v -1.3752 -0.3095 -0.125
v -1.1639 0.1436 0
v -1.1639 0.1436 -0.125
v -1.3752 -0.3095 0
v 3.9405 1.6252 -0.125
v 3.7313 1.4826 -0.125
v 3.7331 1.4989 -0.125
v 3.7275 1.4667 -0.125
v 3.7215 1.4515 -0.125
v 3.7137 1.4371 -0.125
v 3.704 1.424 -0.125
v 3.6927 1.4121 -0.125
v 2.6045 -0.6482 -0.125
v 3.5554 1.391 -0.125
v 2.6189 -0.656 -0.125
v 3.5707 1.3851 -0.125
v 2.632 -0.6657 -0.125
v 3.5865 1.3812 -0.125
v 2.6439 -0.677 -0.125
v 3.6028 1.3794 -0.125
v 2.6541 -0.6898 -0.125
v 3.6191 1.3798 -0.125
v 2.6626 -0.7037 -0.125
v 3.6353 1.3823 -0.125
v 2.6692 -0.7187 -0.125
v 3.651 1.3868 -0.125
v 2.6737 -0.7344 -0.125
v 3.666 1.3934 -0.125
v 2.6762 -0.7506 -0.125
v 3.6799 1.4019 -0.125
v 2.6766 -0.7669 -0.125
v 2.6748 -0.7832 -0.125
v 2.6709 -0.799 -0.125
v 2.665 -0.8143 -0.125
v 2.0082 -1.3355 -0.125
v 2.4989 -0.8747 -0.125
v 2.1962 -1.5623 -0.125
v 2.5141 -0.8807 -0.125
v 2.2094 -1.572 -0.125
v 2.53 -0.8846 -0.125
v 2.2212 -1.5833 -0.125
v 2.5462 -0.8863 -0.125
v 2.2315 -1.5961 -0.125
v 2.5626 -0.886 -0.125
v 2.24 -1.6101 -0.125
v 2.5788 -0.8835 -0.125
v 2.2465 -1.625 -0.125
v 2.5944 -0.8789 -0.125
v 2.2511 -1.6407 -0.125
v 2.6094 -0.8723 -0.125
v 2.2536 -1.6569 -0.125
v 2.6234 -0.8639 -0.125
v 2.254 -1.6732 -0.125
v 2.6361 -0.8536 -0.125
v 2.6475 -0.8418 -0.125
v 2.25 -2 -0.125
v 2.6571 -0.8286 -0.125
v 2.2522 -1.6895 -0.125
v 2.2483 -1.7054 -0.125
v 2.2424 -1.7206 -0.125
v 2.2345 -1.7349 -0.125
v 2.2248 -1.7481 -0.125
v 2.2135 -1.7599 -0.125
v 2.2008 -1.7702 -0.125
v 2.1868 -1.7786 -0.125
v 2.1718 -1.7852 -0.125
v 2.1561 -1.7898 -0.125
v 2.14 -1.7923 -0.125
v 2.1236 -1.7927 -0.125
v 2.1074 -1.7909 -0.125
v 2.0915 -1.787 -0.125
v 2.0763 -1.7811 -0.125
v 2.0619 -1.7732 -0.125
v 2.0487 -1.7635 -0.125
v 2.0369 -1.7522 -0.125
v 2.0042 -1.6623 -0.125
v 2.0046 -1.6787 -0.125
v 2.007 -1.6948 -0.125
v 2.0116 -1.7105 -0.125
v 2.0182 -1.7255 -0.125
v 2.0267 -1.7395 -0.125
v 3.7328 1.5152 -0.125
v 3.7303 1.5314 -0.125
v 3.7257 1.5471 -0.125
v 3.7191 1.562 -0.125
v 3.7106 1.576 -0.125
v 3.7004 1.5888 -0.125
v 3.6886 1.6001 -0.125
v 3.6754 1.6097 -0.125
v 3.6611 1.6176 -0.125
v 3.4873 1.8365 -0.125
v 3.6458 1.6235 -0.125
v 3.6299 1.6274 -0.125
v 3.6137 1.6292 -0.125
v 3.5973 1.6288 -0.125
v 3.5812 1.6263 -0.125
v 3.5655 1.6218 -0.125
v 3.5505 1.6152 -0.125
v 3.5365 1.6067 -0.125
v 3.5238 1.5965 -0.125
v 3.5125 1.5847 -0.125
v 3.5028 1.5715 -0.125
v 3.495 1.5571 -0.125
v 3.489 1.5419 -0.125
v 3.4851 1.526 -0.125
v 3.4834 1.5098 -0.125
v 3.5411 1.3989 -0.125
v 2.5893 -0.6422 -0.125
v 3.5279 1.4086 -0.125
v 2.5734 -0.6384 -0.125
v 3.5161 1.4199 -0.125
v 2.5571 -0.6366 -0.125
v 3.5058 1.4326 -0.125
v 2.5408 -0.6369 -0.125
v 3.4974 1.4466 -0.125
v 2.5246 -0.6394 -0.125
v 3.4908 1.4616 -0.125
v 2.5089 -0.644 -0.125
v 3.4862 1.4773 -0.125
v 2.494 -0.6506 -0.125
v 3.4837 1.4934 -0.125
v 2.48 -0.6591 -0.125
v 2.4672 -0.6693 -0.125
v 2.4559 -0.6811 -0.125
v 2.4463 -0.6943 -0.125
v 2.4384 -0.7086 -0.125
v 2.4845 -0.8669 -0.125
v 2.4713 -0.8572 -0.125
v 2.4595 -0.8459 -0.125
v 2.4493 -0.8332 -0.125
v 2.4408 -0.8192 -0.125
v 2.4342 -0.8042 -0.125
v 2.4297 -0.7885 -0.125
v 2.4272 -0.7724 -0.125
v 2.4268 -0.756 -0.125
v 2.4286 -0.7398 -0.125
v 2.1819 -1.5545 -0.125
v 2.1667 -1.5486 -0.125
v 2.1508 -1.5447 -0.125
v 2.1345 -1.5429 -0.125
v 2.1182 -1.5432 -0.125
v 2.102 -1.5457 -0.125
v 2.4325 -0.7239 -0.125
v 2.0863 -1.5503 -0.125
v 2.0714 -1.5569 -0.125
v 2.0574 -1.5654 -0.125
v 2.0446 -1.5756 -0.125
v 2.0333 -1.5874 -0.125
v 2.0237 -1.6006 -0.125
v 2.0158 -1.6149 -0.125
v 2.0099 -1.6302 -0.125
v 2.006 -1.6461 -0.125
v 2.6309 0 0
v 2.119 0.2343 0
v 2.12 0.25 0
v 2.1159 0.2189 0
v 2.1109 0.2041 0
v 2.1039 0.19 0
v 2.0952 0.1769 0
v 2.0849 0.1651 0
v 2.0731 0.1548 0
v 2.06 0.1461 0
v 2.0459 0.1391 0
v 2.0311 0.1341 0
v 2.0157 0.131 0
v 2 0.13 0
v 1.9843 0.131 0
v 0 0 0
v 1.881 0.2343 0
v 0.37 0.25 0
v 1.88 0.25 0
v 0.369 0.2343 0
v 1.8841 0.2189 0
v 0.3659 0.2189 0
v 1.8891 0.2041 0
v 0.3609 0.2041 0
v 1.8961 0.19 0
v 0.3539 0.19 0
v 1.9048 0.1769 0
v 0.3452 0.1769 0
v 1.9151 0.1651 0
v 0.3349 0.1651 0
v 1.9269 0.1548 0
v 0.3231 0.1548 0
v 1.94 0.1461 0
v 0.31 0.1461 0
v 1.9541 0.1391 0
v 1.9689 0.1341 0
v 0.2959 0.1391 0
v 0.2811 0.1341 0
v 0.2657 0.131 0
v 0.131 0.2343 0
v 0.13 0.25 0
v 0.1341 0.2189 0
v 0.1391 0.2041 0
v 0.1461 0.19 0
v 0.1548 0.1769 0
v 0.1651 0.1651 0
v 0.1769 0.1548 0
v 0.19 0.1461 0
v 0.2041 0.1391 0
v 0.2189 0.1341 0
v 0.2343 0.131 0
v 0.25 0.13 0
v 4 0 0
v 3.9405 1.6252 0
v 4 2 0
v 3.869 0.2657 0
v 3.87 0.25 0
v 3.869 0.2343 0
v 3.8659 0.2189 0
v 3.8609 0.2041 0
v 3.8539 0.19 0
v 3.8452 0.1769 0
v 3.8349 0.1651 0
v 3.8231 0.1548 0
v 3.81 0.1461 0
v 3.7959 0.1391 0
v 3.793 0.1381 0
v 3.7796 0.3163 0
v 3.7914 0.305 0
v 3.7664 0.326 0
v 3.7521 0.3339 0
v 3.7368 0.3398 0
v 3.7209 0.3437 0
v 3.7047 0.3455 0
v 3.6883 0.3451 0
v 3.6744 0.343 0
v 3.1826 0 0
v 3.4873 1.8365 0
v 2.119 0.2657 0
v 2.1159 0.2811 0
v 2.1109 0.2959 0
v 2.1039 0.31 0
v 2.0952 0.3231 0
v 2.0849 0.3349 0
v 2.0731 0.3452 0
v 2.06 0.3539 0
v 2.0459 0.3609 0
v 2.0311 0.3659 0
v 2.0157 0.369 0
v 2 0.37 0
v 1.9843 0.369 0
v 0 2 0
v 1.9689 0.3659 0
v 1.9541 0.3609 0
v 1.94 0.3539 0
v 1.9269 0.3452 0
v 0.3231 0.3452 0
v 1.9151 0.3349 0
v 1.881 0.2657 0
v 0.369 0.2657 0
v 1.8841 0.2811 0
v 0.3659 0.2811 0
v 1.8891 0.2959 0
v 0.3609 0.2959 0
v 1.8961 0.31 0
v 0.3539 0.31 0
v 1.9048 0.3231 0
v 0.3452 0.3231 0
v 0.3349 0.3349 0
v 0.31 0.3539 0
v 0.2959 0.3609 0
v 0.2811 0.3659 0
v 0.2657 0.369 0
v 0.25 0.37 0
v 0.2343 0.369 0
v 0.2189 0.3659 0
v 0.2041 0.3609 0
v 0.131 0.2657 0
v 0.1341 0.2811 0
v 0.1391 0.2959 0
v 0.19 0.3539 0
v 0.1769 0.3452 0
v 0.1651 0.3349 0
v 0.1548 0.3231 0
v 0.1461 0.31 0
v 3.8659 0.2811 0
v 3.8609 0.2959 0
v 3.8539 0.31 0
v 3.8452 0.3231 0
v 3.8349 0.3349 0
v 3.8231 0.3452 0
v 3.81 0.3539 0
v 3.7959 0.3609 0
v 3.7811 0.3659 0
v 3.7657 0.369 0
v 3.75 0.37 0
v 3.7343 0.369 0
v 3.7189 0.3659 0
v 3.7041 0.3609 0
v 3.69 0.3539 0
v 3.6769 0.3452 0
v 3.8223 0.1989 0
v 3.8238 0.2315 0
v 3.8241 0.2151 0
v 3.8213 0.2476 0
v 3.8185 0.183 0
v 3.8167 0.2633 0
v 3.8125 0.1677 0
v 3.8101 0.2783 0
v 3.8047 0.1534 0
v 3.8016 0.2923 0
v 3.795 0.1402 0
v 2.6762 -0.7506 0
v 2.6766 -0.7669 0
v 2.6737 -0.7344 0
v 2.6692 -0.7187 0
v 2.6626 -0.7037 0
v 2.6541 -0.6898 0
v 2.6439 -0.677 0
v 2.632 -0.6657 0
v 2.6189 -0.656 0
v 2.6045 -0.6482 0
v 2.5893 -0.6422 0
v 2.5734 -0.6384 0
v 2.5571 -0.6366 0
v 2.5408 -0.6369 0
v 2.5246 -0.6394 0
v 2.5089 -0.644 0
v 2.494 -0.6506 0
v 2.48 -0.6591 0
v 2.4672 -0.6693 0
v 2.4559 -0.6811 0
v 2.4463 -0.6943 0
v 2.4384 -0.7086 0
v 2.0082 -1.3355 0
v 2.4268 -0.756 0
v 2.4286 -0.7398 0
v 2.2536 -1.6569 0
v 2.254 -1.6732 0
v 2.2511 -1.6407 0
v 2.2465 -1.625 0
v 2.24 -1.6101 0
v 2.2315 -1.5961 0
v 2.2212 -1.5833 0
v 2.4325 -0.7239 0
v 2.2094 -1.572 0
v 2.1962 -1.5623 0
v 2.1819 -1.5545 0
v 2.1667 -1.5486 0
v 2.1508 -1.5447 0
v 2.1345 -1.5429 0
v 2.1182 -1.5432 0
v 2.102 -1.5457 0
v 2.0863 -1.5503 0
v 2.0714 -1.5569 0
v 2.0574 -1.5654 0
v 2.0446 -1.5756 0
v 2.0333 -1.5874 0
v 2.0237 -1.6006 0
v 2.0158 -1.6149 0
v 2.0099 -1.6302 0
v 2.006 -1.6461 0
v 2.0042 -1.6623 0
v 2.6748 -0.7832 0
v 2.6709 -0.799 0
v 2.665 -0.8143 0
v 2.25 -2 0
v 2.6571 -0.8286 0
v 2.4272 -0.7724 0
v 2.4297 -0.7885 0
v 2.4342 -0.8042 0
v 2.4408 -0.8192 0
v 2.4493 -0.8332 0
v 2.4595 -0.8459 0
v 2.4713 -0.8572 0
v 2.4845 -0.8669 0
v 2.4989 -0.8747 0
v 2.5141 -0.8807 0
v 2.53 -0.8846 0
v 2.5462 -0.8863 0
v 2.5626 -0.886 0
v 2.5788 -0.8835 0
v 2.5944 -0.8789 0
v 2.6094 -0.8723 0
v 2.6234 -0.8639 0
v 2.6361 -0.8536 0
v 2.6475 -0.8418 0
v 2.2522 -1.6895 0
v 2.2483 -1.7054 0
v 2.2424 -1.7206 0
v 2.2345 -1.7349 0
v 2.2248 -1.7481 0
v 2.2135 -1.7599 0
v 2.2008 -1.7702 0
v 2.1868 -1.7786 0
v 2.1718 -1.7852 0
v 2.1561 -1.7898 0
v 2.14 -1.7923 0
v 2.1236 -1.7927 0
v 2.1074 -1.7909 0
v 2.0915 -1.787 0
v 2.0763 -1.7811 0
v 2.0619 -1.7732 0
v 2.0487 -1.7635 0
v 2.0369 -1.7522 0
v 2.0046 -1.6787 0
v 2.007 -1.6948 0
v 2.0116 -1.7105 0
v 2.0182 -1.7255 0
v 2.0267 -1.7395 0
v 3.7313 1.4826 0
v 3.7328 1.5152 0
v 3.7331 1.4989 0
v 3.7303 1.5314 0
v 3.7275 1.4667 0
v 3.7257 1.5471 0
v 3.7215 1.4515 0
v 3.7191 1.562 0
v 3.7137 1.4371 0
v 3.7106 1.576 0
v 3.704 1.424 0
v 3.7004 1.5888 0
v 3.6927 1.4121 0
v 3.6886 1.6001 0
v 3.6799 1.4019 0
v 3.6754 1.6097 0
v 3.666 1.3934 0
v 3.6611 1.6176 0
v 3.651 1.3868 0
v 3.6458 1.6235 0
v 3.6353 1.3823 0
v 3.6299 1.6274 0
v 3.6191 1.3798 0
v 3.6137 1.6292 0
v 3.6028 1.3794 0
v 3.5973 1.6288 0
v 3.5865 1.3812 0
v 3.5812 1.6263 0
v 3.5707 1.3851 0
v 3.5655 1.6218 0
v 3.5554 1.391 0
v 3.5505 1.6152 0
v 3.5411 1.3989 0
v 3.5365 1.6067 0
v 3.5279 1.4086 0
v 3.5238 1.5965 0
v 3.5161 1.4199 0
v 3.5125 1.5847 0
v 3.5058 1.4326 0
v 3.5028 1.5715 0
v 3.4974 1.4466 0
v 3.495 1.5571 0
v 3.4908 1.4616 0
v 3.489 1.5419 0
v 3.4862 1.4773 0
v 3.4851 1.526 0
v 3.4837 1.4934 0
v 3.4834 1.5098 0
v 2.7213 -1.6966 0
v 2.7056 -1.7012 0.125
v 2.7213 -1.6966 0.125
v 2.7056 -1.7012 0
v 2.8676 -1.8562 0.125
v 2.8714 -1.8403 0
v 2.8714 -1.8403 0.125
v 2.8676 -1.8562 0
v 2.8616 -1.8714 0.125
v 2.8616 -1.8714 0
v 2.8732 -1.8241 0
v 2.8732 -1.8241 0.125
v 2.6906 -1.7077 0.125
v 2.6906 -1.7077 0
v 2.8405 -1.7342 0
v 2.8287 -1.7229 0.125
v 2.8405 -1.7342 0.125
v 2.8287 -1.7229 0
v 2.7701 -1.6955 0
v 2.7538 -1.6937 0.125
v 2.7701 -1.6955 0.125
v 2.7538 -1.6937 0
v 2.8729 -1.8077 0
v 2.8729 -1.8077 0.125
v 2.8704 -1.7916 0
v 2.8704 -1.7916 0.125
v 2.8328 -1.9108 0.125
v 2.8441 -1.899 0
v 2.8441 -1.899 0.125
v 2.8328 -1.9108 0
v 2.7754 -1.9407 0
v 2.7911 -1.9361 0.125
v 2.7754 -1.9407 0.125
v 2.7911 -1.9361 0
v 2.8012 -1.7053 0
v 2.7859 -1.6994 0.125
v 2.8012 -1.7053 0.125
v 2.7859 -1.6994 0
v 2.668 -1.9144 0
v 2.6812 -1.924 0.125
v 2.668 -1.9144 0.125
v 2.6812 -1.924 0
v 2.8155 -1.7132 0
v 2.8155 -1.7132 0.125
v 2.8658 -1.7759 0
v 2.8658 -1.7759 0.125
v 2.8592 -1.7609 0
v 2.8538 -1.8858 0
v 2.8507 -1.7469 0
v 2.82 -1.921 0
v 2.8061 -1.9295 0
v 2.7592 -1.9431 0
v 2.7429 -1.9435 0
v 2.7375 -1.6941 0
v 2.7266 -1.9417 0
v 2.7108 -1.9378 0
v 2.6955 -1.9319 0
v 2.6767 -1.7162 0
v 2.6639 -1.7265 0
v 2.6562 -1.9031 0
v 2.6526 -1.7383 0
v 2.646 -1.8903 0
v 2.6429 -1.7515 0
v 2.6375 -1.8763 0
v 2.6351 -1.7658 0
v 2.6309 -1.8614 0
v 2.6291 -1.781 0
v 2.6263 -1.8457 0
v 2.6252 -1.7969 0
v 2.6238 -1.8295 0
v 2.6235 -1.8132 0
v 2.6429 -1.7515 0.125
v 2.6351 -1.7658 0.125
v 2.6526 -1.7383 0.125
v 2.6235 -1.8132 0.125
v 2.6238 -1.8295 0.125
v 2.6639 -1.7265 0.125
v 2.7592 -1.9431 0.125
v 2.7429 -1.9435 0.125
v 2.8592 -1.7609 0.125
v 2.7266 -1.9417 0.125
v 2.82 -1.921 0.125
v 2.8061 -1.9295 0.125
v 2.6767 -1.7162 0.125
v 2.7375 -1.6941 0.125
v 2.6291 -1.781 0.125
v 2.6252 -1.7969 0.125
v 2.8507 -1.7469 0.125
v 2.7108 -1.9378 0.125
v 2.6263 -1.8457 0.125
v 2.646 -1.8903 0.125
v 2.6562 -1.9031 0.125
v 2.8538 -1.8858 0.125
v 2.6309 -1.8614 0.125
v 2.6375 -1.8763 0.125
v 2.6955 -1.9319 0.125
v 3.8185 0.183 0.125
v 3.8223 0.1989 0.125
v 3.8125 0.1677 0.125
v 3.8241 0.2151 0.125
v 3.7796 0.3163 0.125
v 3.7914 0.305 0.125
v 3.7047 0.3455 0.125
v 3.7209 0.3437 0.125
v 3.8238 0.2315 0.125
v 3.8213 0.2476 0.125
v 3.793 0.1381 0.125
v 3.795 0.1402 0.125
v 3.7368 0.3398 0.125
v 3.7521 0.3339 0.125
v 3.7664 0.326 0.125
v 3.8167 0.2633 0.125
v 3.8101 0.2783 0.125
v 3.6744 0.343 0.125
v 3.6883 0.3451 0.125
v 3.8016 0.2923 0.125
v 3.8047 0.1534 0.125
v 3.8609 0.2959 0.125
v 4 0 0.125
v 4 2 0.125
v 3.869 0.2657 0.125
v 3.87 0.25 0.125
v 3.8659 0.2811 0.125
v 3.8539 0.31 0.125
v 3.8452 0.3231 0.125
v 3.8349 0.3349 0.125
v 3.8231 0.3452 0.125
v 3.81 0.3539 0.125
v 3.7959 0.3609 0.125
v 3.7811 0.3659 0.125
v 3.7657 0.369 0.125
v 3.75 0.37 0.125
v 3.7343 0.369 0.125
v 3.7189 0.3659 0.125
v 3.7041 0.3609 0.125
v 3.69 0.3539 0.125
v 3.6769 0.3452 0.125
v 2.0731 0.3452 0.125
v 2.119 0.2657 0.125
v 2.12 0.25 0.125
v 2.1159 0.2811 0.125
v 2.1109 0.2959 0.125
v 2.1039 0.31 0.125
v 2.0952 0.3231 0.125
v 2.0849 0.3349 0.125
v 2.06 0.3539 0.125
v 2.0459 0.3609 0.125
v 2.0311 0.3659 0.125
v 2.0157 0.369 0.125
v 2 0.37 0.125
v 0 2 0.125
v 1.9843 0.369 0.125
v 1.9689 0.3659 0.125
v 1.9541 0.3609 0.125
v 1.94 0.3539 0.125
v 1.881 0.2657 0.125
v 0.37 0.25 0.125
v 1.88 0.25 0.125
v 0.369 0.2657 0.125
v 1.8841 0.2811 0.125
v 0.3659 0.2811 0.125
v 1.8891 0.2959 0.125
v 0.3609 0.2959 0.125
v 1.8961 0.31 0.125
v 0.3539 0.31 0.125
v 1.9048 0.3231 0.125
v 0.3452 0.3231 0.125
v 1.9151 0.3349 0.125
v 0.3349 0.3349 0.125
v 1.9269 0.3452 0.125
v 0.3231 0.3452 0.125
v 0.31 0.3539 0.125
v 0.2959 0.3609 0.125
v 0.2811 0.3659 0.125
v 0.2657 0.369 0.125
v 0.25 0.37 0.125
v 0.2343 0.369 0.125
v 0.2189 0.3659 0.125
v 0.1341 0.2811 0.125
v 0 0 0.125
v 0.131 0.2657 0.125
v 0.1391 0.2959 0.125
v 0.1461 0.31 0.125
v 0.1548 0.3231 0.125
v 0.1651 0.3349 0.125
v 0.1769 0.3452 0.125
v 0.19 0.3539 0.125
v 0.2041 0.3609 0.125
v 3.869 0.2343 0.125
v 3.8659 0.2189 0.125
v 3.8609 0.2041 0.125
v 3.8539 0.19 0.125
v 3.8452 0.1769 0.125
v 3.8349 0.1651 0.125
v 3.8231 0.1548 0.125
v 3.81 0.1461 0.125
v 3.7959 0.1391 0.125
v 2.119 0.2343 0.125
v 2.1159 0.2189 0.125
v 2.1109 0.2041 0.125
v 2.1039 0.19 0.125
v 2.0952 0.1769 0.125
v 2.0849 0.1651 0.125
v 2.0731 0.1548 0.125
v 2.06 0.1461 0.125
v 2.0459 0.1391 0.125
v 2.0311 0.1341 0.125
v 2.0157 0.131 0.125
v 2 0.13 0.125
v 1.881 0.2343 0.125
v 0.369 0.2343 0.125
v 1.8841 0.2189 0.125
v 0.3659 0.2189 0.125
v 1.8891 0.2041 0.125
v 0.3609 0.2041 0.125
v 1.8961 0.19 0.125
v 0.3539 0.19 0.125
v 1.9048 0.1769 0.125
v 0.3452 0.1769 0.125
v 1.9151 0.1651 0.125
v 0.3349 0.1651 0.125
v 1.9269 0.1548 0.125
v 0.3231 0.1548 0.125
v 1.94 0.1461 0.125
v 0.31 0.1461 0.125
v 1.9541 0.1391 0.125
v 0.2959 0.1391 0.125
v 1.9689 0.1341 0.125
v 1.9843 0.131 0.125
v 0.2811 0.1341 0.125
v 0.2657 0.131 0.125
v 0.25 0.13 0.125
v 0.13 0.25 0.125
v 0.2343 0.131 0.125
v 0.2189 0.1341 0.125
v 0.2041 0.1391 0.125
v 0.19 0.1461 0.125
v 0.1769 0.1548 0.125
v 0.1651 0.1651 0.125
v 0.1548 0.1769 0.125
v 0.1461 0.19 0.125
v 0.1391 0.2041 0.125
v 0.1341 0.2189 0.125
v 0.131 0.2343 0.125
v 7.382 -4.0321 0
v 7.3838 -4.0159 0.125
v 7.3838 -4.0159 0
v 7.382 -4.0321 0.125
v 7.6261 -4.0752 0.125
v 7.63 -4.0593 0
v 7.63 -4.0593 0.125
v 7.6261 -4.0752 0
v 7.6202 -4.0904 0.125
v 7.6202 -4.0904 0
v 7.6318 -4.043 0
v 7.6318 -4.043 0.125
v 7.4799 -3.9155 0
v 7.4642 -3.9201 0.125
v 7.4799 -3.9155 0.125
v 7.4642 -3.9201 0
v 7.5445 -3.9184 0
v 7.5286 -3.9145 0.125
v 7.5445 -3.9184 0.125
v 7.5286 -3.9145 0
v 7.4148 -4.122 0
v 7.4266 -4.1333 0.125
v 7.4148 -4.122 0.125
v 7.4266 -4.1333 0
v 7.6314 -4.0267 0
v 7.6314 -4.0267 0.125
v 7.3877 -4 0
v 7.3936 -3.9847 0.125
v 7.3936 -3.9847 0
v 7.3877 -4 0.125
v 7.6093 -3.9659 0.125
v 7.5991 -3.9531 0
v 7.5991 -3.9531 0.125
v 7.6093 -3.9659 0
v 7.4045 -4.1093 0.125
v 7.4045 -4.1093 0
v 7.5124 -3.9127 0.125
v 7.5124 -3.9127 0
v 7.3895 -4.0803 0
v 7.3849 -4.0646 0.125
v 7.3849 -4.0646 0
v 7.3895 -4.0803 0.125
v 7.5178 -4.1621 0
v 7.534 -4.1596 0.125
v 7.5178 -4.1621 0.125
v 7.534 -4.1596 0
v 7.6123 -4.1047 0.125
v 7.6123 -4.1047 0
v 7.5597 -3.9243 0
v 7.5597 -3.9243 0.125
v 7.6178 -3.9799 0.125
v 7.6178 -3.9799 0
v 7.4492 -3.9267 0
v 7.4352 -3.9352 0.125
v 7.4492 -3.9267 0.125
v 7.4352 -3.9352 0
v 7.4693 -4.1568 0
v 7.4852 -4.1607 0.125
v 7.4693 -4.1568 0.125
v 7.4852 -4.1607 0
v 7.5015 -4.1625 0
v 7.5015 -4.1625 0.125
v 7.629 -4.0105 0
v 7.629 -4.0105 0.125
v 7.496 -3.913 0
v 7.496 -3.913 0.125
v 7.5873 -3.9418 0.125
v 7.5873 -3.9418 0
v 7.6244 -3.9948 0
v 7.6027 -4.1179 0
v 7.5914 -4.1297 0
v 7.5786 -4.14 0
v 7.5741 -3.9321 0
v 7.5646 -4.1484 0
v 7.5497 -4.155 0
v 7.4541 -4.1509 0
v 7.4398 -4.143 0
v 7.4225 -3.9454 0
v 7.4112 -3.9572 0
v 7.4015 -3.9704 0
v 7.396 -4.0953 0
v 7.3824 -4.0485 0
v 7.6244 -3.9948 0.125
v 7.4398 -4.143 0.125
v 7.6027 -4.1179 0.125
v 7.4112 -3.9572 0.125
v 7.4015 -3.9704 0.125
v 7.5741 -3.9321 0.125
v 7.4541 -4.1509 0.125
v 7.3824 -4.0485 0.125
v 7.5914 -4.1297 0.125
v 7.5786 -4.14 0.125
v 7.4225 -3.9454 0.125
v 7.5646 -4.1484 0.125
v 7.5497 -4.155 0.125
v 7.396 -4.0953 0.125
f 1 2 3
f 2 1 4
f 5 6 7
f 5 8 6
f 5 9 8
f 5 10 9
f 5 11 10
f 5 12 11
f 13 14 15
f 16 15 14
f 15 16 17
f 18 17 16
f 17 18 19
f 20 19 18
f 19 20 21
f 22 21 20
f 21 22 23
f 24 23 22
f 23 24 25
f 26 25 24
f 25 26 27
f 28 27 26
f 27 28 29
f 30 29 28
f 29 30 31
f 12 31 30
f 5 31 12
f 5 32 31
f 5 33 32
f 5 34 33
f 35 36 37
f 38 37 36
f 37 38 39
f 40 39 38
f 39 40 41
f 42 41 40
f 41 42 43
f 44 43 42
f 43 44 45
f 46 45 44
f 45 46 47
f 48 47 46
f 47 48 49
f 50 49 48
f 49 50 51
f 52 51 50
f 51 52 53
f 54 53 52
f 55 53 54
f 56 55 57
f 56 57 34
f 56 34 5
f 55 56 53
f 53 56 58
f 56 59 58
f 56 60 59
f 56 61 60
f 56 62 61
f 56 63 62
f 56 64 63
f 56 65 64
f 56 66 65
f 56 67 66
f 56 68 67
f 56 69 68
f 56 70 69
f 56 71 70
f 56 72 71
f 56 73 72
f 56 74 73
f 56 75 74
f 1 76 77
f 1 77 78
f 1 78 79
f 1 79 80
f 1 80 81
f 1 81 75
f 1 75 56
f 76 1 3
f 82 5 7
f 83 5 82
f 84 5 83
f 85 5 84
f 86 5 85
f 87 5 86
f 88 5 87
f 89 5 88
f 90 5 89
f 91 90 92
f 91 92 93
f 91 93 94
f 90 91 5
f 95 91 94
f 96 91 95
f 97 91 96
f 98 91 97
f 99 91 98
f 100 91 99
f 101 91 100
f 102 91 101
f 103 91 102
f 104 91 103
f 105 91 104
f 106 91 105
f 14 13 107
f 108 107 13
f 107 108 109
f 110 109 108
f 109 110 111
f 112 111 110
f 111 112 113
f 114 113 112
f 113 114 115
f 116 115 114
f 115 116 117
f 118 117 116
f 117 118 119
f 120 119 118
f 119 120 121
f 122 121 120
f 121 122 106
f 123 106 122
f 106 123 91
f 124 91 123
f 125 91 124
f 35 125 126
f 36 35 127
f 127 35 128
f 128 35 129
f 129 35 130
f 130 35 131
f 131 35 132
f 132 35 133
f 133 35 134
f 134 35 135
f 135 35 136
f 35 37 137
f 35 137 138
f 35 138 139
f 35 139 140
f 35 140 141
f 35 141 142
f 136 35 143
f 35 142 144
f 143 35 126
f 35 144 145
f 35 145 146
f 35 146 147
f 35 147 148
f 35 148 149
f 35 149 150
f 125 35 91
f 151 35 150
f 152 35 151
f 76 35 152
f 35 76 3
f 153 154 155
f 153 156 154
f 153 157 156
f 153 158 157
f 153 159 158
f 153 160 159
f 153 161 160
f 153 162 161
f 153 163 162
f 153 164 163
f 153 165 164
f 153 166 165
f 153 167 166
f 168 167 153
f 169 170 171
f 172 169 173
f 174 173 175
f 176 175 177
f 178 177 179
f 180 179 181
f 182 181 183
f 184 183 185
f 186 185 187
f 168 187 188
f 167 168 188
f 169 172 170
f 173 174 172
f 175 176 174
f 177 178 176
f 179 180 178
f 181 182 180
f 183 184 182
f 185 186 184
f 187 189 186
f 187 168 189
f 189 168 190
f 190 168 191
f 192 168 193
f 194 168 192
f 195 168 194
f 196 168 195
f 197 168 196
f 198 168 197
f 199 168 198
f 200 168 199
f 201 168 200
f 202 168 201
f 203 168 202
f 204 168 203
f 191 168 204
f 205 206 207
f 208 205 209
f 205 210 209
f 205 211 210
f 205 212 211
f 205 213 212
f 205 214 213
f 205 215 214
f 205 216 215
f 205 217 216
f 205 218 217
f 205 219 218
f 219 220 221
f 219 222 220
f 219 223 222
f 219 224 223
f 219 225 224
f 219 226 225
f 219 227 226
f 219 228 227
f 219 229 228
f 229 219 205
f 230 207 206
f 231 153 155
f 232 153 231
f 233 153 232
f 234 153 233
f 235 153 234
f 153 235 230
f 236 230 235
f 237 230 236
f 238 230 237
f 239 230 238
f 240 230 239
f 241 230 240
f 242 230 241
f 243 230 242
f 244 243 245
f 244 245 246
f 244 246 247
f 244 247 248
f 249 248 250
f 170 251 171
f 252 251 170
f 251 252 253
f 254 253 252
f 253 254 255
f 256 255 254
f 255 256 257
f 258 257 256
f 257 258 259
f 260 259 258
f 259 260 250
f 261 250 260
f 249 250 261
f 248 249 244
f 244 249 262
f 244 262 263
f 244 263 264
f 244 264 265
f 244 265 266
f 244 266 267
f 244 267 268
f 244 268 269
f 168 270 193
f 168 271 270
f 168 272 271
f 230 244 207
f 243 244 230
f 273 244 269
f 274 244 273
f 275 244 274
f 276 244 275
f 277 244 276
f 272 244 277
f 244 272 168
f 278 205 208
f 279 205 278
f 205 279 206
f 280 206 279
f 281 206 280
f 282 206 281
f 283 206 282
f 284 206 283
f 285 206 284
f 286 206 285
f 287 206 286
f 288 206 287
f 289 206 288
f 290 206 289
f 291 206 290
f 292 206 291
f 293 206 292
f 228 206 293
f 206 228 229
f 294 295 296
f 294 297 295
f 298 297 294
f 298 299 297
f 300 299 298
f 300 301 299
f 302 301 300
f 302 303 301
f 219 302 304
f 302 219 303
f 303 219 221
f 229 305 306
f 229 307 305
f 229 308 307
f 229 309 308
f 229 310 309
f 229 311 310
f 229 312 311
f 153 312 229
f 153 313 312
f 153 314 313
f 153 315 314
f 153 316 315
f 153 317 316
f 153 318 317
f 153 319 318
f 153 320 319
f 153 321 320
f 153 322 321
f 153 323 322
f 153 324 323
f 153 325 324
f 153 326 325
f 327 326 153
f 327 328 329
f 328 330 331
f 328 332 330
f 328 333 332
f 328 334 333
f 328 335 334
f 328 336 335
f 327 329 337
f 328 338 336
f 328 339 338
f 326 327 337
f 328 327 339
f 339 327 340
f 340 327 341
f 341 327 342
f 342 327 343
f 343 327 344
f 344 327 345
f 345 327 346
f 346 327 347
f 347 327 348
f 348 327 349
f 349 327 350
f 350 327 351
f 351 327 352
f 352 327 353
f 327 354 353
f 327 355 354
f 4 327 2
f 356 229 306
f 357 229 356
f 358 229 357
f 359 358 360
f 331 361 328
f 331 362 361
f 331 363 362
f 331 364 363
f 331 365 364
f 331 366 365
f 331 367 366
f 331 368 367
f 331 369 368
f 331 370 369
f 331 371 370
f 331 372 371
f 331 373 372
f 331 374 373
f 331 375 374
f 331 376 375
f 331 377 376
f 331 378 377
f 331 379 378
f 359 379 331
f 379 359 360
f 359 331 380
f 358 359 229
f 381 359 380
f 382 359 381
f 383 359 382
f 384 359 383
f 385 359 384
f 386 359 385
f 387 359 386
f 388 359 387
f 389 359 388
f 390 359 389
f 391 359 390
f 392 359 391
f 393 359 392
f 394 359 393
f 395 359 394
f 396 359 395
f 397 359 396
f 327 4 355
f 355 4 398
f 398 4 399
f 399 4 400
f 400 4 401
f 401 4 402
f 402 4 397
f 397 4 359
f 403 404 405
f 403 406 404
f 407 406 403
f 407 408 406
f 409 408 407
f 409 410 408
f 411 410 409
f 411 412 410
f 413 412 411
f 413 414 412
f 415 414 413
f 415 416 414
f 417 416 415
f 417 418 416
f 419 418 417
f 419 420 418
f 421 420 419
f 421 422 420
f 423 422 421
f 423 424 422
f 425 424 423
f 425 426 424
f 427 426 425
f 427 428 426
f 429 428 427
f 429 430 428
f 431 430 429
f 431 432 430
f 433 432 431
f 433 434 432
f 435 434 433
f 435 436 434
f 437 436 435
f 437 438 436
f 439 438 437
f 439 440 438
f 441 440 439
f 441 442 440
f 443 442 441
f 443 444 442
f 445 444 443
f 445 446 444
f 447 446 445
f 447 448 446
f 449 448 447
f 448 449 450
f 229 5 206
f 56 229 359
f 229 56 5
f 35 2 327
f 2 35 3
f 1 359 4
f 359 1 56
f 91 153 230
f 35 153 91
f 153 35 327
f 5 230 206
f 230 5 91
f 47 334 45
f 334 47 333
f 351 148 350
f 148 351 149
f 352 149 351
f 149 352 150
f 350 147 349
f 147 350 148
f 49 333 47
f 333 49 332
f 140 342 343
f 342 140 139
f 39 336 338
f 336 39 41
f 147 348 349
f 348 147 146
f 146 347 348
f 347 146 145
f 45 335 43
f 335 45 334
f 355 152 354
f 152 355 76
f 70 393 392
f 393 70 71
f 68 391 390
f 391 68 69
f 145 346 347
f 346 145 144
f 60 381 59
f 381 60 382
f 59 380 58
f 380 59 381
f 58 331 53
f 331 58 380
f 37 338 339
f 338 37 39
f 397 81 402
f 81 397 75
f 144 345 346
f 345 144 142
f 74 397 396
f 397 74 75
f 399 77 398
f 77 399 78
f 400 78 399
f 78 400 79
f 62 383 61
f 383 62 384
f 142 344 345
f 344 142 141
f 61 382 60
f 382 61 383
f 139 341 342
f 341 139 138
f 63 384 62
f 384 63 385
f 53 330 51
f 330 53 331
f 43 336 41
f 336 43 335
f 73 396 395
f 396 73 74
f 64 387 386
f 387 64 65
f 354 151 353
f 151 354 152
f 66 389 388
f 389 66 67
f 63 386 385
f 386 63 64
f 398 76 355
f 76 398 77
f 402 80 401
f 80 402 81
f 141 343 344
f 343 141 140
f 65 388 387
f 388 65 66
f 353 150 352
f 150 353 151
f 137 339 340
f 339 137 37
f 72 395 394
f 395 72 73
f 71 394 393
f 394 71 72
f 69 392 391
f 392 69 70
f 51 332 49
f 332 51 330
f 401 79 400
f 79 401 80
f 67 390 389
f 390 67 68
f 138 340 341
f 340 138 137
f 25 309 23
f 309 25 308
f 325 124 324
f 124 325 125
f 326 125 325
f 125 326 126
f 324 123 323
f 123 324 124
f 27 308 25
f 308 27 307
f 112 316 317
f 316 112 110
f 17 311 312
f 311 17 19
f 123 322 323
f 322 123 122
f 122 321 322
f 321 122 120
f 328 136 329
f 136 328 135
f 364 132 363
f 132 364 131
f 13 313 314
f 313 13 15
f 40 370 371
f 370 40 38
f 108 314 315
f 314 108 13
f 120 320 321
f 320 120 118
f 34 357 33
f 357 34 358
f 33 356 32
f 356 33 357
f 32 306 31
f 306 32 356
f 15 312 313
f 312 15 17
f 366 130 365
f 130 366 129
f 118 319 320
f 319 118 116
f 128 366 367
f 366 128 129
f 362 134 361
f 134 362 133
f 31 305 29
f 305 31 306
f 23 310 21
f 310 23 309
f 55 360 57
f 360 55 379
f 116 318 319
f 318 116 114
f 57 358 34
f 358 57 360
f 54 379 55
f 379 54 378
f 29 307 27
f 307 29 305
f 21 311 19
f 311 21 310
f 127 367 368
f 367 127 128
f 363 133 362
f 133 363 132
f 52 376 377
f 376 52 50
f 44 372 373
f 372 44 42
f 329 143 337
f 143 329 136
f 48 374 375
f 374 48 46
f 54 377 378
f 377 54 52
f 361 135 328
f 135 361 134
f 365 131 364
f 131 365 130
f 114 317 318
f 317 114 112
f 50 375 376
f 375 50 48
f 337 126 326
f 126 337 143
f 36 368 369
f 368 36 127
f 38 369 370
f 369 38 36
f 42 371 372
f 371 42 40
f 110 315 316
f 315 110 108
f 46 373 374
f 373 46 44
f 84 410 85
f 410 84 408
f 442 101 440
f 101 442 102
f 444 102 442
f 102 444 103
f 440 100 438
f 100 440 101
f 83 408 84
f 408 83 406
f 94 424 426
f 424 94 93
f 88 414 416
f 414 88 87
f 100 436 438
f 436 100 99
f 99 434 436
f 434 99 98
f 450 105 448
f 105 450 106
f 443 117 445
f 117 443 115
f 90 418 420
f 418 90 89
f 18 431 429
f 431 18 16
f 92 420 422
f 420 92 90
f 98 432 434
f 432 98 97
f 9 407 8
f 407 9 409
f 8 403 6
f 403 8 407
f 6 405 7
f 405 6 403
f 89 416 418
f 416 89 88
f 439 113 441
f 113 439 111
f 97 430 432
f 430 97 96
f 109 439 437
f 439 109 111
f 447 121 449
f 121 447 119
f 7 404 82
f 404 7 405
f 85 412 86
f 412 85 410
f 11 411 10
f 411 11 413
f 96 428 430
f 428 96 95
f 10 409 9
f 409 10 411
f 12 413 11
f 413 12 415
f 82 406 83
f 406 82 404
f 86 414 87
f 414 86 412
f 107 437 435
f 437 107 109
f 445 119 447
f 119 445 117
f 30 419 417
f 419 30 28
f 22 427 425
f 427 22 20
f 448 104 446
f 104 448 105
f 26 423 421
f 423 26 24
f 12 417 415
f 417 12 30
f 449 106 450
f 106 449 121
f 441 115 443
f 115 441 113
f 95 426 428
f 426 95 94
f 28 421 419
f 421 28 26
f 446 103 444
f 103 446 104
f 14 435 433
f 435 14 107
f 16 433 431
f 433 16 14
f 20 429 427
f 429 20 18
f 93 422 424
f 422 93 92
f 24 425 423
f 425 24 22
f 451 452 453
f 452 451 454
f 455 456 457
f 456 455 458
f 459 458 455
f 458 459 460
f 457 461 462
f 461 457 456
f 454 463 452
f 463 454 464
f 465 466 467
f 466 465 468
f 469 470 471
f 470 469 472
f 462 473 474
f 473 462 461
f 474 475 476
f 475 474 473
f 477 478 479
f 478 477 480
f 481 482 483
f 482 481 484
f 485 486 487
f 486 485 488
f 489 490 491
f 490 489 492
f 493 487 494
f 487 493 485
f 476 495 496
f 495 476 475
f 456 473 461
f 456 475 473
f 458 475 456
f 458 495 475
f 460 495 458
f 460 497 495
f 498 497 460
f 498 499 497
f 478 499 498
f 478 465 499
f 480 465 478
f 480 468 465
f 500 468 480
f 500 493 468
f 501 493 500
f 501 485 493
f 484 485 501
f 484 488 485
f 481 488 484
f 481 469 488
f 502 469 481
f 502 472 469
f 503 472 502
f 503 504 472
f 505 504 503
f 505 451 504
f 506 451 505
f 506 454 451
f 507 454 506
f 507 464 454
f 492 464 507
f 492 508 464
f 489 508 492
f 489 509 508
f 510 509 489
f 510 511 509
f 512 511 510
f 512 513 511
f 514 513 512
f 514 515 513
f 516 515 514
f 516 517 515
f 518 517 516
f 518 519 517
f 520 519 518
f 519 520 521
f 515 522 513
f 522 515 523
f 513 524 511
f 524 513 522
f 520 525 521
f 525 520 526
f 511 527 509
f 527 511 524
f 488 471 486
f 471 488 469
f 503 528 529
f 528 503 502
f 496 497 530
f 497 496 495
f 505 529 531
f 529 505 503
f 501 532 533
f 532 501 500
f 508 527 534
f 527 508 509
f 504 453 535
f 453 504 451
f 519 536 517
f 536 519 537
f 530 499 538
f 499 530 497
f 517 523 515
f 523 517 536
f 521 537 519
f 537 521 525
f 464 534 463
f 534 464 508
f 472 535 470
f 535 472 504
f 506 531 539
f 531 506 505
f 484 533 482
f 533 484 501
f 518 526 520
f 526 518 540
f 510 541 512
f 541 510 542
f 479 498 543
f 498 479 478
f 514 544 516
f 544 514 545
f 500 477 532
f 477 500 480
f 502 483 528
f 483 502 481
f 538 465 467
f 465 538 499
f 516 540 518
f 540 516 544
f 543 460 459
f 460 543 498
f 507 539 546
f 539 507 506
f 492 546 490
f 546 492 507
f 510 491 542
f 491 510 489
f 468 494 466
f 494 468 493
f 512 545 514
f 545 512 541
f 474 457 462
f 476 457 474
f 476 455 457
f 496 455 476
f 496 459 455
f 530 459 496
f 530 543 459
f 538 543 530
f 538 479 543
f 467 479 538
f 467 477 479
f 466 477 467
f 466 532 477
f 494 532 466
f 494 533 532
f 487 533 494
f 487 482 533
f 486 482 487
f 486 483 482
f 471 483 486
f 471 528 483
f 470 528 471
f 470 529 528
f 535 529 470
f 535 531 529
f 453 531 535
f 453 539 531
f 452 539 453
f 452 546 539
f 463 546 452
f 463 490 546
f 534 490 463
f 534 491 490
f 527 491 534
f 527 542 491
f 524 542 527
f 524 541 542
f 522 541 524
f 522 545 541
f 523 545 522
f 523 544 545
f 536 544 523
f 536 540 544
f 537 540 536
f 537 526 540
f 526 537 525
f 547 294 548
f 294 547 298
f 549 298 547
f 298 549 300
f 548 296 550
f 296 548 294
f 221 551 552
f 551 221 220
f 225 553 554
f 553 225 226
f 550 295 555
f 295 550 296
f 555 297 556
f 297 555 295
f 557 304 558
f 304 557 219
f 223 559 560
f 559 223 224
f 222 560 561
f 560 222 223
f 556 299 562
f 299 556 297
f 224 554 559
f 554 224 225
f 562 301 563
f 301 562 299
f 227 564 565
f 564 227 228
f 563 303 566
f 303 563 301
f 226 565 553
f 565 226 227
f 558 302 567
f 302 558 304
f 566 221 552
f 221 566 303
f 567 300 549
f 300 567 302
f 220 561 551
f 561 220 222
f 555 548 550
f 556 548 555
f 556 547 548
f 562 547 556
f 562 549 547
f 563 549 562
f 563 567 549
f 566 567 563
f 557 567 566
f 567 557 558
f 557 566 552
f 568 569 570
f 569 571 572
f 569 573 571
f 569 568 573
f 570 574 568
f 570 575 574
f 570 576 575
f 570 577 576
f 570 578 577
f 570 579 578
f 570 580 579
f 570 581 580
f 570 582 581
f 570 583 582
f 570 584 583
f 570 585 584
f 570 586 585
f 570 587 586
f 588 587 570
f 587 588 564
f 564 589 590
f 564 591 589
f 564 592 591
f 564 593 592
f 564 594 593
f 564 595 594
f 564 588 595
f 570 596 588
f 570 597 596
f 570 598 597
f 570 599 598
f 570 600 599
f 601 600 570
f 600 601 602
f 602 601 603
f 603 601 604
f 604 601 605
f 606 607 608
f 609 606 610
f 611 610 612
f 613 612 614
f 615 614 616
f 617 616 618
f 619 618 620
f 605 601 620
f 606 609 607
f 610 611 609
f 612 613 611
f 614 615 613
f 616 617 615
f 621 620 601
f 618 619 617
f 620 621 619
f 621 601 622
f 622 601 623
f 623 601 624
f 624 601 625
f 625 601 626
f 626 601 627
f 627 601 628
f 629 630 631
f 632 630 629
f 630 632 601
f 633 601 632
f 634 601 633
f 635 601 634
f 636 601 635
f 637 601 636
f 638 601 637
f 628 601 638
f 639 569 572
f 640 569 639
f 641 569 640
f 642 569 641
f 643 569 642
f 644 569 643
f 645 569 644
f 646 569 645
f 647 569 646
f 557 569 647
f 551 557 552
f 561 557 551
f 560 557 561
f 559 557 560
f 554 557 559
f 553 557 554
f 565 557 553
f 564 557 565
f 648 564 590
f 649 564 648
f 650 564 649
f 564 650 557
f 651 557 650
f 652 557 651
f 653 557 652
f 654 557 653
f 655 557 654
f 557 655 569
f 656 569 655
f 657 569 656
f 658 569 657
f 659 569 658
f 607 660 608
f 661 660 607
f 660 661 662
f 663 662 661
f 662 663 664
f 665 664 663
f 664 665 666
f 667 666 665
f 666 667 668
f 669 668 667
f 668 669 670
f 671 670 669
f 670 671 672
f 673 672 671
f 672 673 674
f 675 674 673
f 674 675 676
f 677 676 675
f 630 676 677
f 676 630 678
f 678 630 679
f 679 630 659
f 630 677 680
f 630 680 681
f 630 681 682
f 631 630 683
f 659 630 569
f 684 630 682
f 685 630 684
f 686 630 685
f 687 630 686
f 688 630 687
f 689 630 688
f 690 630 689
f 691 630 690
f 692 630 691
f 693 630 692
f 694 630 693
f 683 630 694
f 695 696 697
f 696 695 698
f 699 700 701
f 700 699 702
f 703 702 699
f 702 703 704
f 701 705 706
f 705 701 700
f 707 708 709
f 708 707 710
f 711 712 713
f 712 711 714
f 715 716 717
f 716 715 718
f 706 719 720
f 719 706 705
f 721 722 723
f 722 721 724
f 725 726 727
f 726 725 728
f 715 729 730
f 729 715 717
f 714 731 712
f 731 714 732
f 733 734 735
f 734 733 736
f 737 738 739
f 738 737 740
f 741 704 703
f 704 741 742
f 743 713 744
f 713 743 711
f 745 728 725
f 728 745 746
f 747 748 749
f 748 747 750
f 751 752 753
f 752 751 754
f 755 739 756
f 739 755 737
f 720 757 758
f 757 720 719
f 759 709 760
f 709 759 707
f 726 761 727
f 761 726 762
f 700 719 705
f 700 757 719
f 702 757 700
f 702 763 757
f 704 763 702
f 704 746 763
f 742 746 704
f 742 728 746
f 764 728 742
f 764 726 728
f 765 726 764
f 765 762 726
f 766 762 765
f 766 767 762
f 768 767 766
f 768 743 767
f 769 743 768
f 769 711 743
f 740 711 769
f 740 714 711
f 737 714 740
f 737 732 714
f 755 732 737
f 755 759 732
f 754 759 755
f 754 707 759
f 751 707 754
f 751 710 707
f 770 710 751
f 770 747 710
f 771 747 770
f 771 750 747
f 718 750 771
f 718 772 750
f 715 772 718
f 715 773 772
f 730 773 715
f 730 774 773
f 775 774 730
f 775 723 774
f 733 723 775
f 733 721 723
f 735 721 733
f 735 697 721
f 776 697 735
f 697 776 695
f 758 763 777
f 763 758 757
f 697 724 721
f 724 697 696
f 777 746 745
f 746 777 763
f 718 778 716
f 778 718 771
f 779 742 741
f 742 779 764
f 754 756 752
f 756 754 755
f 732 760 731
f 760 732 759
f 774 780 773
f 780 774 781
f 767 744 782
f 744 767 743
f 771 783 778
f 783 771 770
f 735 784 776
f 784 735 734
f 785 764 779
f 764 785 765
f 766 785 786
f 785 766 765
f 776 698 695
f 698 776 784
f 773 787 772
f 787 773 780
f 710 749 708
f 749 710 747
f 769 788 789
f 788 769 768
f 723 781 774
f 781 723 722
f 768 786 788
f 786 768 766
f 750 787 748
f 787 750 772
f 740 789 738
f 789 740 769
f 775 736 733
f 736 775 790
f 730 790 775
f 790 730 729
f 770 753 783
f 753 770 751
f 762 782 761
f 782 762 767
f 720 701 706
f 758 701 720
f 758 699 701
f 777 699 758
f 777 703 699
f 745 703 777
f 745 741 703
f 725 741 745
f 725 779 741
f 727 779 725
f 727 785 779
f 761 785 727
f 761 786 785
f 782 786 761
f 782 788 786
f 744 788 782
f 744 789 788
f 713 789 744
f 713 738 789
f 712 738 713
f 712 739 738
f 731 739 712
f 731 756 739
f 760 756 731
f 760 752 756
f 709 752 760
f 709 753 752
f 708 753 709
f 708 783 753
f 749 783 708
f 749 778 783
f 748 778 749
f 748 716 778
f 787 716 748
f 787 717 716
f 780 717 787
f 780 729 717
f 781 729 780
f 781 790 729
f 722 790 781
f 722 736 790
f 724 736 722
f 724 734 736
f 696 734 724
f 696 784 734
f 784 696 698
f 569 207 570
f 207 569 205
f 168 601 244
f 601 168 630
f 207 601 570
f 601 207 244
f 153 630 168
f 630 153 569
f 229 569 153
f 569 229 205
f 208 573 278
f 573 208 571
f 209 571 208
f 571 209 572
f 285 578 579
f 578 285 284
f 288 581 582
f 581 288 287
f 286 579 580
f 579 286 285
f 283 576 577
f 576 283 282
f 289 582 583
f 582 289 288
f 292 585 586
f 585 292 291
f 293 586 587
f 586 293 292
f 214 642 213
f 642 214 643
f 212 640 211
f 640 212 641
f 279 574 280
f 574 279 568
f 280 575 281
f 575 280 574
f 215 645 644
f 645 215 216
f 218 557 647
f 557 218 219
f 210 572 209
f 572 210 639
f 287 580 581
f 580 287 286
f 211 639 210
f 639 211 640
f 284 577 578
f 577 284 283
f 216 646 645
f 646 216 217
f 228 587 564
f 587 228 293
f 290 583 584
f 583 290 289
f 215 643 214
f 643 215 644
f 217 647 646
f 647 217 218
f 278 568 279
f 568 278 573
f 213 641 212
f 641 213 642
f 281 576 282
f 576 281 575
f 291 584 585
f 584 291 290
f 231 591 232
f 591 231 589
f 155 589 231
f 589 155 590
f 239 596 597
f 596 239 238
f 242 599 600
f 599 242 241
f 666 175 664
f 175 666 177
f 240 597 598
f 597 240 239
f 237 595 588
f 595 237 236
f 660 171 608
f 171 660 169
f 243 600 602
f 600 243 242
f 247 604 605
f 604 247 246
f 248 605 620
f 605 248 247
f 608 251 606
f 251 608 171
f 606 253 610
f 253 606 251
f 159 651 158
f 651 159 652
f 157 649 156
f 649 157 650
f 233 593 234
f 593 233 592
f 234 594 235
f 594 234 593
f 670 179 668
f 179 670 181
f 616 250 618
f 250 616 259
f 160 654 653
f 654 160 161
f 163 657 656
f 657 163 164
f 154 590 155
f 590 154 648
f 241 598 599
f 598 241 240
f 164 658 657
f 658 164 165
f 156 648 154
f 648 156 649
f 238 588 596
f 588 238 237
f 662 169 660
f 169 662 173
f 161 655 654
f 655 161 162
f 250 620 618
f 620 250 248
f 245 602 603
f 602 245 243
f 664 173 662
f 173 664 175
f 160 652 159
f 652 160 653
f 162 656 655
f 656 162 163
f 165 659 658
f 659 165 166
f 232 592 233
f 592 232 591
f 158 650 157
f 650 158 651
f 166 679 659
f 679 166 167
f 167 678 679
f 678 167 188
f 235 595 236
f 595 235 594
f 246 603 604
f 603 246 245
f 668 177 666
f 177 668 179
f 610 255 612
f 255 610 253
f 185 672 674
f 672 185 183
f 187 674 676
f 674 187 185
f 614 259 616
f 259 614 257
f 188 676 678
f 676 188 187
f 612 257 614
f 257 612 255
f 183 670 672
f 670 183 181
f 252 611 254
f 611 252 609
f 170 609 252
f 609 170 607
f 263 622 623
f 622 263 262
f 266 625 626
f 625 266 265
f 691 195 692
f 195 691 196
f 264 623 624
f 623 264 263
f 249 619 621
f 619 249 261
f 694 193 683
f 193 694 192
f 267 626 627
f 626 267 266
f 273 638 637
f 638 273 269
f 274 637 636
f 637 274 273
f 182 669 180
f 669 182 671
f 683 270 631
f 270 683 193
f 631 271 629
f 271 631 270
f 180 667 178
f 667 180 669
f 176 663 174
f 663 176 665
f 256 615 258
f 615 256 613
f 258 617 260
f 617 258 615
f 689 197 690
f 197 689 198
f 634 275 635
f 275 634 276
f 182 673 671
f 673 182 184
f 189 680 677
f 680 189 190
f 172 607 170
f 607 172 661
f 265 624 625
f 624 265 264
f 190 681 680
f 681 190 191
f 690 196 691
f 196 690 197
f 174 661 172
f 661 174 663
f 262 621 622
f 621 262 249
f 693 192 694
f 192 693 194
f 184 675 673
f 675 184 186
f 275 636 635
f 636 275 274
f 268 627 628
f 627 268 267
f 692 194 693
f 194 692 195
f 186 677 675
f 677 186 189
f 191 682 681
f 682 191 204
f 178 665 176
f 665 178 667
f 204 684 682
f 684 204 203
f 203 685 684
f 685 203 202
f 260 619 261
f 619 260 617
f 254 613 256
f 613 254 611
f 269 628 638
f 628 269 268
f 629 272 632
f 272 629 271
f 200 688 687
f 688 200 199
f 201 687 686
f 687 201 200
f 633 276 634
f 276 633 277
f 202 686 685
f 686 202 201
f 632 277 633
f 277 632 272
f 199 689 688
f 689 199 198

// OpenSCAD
$fn = 48;

union() {
	union() {
		translate(v = [2.2500000000, -2, 0]) {
            rotate([0,0,$t*60-25,0]){
			color(c = "red") {
				difference() {
					rotate(a = [0, 180, 0]) {
						difference() {
							union() {
								color(c = "blue") {
									cube(size = [4.0000000000, 0.5000000000, 0.1250000000]);
								}
								color(c = "red") {
									cube(size = [0.5000000000, 4.0000000000, 0.1250000000]);
								}
							}
							translate(v = [0.2500000000, 0.2500000000, 0]) {
								cylinder(h = 0.1250000000, r = 0.1250000000);
							}
							translate(v = [0.2500000000, 1.2500000000, 0]) {
								cylinder(h = 0.1250000000, r = 0.1250000000);
							}
							translate(v = [0.2500000000, 3.7500000000, 0]) {
								cylinder(h = 0.1250000000, r = 0.1250000000);
							}
						}
					}}
					translate(v = [0.3750000000, 0.3750000000, 0]) {
						cylinder(h = 0.1250000000, r = 0.1250000000);
					}
					translate(v = [0.3750000000, 2.6250000000, 0]) {
						cylinder(h = 0.1250000000, r = 0.1250000000);
					}
					translate(v = [5.6255000000, 0.3750000000, 0]) {
						cylinder(h = 0.1250000000, r = 0.1250000000);
					}
				}
			}
		}
		difference() {
			cube(size = [4, 2, 0.1250000000]);
			translate(v = [3.7500000000, 0.2500000000]) {
				cylinder(h = 0.2500000000, r = 0.1200000000);
			}
			translate(v = [2, 0.2500000000]) {
				cylinder(h = 0.2500000000, r = 0.1200000000);
			}
			translate(v = [0.2500000000, 0.2500000000]) {
				cylinder(h = 0.2500000000, r = 0.1200000000);
			}
			translate(v = [2, -2, 0]) {
				difference() {
					intersection() {
						circle(r = 3.7500000000);
						union() {
							rotate(a = 65) {
								translate(v = [0, 3.7500000000, 0]) {
									square(center = true, size = [11.2500000000, 7.5000000000]);
								}
							}
							rotate(a = 5) {
								translate(v = [0, -3.7500000000, 0]) {
									square(center = true, size = [11.2500000000, 7.5000000000]);
								}
							}
						}
					}
					intersection() {
						circle(r = 3.6250000000);
						union() {
							rotate(a = 65) {
								translate(v = [0, 3.6250000000, 0]) {
									square(center = true, size = [10.8750000000, 7.2500000000]);
								}
							}
							rotate(a = 5) {
								translate(v = [0, -3.6250000000, 0]) {
									square(center = true, size = [10.8750000000, 7.2500000000]);
								}
							}
						}
					}
				}
			}
		}
	}
}
/***********************************************
*********      SolidPython code:      **********
************************************************
 
#! /usr/bin/env python
# -*- coding: UTF-8 -*-
from __future__ import division
import os
import sys
import re

# Assumes SolidPython is in site-packages or elsewhwere in sys.path
from solid import *
from solid.utils import *

SEGMENTS = 48

eccentric_plate_x = 3;
eccentric_plate_y = 3;
eccentric_plate_z = 0.125;


#rotate([0,0, -$t*95+15] ) 
def bell_crank():
    a = color("red") (difference() (
        rotate( [0,180,0] ) (
          difference()(
            union() (
                color("blue") (cube([rad+.25,.5,.125])),
                color("red") (cube([.5,rad+.25,.125])),
            ),
            translate([0.25,.25,0]) (cylinder(r=.125,h=.125)),
            translate([0.25,1.25,0]) (cylinder(r=.125,h=.125)),
            translate([0.25,rad,0]) (cylinder(r=.125,h=.125)),
          ),
        ),
        translate([0.375,.375,0]) (cylinder(r=.125,h=.125)),
        translate([0.375,2.625,0])( cylinder(r=.125,h=.125)),
        translate([5.6255,.375,0])( cylinder(r=.125,h=.125)),
      )
    )
    return a

# arc radius, also bell crank length
rad=3.75;
s=65;
e=5;
#rotate([0,0,$t*60-25,0]){
def curved_link():
    a = union()(
            translate([2.25,-2,0])(bell_crank()),

            difference () (
                cube( [4,2, 0.125]),
            
        
                translate( [3.75, .25] )( cylinder(r=0.12, h=.25)),
                translate( [2, .25] ) (cylinder(r=0.12, h=.25)),
                translate( [.25, .25] ) (cylinder(r=0.12, h=.25)), 

                # ARC ARC ARC
                translate([2,-2,0])(
                    difference()(
                        arc(rad=rad, start_degrees=s, end_degrees=e),
                        arc(rad=rad-.125, start_degrees=s, end_degrees=e),
                    ),
                ),
        )
    )
    return a


def assembly():
    # Your code here!
    a = union() (
        curved_link(),
    )
    return a

if __name__ == '__main__':
    a = assembly()
    out_dir = sys.argv[1] if len(sys.argv) > 1 else os.curdir
    file_out = os.path.join(out_dir, sys.argv[0])
    scad_render_to_file(a, file_header='$fn = %s;' % SEGMENTS, include_orig_code=True)


    print("%(__file__)s: SCAD file written to: \n%(file_out)s" % vars())
    bom = bill_of_materials()
    print(bom)



 
 
************************************************/
